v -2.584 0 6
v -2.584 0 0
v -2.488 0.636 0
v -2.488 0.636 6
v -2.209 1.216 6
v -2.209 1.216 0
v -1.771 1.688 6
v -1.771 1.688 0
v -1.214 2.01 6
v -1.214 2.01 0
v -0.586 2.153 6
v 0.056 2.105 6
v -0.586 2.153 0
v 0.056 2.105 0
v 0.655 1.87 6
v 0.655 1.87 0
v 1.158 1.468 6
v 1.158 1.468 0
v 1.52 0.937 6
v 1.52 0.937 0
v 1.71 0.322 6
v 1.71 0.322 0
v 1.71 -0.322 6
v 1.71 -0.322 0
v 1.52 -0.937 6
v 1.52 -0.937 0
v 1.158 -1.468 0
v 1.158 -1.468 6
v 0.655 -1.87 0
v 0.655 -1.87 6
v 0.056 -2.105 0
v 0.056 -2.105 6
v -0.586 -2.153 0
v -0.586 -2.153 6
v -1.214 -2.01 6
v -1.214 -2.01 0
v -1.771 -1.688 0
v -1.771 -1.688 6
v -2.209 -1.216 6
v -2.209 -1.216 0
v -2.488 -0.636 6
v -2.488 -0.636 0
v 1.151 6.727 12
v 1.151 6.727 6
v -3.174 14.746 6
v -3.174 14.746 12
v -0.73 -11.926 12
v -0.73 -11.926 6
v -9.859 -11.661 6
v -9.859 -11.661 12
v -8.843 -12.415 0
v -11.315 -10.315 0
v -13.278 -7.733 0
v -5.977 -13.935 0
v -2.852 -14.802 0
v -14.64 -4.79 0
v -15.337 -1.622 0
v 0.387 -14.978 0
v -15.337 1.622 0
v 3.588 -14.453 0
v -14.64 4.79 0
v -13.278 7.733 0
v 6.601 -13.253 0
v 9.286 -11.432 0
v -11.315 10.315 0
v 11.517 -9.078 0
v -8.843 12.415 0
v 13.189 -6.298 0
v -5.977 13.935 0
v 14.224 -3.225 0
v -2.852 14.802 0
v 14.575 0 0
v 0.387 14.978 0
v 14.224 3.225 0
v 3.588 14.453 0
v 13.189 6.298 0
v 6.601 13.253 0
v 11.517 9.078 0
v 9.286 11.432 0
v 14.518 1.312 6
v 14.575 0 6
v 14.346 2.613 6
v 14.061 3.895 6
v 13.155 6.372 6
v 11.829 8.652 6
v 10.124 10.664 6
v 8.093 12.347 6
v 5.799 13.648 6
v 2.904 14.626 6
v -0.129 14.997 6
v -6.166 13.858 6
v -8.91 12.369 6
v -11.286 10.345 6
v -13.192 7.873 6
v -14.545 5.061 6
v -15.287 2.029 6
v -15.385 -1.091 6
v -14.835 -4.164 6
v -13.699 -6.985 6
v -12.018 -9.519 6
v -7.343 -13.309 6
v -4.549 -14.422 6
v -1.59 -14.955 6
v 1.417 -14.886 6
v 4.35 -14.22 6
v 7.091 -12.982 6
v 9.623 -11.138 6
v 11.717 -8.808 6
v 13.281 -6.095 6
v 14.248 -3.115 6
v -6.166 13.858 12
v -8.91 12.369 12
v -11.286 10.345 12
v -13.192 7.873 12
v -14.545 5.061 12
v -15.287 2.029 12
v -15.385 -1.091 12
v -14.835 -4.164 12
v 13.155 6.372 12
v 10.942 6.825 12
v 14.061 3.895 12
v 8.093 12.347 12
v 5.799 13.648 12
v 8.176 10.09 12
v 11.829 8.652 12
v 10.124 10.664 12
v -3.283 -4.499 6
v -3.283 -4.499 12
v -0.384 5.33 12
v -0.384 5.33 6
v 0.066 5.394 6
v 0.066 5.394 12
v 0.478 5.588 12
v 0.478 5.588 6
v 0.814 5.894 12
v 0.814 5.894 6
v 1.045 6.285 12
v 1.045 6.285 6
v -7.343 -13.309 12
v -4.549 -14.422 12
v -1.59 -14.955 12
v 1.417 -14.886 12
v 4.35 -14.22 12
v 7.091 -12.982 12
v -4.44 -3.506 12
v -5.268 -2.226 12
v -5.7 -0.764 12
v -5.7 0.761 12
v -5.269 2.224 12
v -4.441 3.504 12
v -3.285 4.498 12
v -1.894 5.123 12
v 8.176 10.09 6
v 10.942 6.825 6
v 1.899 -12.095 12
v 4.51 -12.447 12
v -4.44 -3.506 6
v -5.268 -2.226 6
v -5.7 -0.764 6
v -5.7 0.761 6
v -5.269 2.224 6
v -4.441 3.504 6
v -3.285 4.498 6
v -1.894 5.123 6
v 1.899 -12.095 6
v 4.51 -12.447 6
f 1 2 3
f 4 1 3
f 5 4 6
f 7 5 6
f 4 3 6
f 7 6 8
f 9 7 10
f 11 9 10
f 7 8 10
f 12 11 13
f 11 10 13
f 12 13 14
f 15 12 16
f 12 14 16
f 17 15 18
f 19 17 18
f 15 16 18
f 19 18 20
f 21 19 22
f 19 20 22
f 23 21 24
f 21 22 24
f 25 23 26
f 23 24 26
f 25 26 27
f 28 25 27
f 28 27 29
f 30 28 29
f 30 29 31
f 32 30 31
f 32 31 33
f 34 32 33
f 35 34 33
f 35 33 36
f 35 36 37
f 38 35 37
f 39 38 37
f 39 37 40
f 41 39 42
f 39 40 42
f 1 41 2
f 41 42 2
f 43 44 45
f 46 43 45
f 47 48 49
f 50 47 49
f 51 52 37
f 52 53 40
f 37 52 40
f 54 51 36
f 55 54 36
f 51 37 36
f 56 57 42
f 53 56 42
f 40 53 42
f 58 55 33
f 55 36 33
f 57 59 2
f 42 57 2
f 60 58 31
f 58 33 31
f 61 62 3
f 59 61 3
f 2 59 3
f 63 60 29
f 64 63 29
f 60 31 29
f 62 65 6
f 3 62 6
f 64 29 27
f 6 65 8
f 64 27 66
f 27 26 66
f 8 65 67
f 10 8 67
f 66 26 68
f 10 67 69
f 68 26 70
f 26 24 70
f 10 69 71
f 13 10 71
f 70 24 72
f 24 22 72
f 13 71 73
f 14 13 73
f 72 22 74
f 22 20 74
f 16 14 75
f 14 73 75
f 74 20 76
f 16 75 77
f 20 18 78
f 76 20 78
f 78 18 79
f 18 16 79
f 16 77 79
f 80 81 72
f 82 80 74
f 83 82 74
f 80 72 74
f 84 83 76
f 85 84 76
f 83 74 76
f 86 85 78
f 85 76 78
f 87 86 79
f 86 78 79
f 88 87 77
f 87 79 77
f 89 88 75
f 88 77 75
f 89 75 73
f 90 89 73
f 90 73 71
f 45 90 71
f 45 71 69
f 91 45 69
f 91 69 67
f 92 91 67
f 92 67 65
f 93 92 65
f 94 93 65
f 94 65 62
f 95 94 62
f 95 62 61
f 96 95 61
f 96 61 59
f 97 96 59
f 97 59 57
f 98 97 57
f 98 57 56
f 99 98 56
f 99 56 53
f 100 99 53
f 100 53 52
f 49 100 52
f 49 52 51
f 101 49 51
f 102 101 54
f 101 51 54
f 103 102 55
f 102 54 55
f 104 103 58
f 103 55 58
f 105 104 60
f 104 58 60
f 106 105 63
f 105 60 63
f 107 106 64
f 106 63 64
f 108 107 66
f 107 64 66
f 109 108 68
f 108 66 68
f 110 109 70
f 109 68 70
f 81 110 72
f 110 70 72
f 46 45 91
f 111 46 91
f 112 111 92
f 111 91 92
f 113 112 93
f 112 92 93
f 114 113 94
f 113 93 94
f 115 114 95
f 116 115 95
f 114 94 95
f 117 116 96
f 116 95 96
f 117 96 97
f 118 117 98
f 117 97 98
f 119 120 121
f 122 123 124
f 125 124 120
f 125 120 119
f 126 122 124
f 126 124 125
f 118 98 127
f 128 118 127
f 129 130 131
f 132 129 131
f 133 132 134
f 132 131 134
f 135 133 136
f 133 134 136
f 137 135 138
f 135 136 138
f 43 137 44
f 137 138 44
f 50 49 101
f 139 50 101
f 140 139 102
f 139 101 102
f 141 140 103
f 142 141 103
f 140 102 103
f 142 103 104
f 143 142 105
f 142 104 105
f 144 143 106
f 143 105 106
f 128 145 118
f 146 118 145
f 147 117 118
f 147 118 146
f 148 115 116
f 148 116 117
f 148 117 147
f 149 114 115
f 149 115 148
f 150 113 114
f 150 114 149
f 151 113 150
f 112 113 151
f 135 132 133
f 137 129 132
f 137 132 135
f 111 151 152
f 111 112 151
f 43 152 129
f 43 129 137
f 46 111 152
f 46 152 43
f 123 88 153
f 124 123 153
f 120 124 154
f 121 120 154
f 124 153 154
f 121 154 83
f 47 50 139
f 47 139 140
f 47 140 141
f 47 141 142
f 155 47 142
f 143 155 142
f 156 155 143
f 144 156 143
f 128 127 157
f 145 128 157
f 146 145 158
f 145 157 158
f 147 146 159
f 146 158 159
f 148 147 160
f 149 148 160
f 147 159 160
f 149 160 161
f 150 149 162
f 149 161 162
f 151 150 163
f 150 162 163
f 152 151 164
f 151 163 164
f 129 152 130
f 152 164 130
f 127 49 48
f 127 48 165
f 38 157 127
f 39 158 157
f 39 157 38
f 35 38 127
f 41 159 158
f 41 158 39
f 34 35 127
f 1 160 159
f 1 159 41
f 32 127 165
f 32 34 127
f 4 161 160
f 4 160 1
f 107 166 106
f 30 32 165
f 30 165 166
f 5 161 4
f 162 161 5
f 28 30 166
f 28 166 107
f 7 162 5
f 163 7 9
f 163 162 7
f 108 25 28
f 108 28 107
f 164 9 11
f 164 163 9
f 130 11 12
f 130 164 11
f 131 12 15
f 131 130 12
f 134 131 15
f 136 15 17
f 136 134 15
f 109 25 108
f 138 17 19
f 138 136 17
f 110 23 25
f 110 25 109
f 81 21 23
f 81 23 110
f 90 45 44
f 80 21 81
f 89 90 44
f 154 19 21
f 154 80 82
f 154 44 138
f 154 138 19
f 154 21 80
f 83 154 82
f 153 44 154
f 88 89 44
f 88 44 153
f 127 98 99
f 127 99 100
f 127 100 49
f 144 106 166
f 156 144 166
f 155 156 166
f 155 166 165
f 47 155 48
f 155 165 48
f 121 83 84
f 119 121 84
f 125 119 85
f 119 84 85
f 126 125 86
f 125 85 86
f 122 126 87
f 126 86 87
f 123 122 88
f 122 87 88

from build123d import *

# Parameters (mm, degrees)
CROQUIS2_R              = 15
SALIENTE_EXTRUIR1_DEPTH = 6
CROQUIS3_R              = 2.159
CORTAR_EXTRUIR1_DEPTH   = 6
SALIENTE_EXTRUIR2_DEPTH = 6


with BuildPart() as part:
    # Croquis2 → Saliente-Extruir1 (new body)
    with BuildSketch(Plane.XY):
        with Locations((-0.424832659, 0)):
            Circle(CROQUIS2_R)
    extrude(amount=SALIENTE_EXTRUIR1_DEPTH)

    # Croquis3 → Cortar-Extruir1 (cut)
    with BuildSketch(Plane(origin=(0, 0, 0), x_dir=(-1, 0, 0), z_dir=(0, 0, -1))):
        with Locations((0.424832659, 0)):
            Circle(CROQUIS3_R)
    extrude(amount=-CORTAR_EXTRUIR1_DEPTH, mode=Mode.SUBTRACT)

    # Croquis5 → Saliente-Extruir2 (add)
    with BuildSketch(Plane.XY.offset(6)):
        with BuildLine():
            Line((1.150657303, 6.727260511), (-3.173951667, 14.745926376))
            ThreePointArc((-3.173951667, 14.745926376), (-13.192330391, 7.873436458), (-14.835285649, -4.16399383))
            Line((-14.835285649, -4.16399383), (-3.282721328, -4.499041271))
            ThreePointArc((-3.282721328, -4.499041271), (-5.537081833, 1.507915241), (-0.38358243, 5.329840374))
            ThreePointArc((-0.38358243, 5.329840374), (0.657157734, 5.728140337), (1.150657303, 6.727260511))
        make_face()
        with BuildLine():
            ThreePointArc((14.060690832, 3.894818251), (11.020642477, 9.695416387), (5.798891595, 13.647903004))
            ThreePointArc((5.798891595, 13.647903004), (9.512311917, 8.417715579), (14.060690832, 3.894818251))
        make_face()
        with BuildLine():
            Line((-0.730311074, -11.926156717), (-9.859444413, -11.661393616))
            ThreePointArc((-9.859444413, -11.661393616), (-1.589548178, -14.954712895), (7.090520152, -12.981505003))
            ThreePointArc((7.090520152, -12.981505003), (3.207869051, -12.248077397), (-0.730311074, -11.926156717))
        make_face()
    extrude(amount=SALIENTE_EXTRUIR2_DEPTH)


solid = part.part
